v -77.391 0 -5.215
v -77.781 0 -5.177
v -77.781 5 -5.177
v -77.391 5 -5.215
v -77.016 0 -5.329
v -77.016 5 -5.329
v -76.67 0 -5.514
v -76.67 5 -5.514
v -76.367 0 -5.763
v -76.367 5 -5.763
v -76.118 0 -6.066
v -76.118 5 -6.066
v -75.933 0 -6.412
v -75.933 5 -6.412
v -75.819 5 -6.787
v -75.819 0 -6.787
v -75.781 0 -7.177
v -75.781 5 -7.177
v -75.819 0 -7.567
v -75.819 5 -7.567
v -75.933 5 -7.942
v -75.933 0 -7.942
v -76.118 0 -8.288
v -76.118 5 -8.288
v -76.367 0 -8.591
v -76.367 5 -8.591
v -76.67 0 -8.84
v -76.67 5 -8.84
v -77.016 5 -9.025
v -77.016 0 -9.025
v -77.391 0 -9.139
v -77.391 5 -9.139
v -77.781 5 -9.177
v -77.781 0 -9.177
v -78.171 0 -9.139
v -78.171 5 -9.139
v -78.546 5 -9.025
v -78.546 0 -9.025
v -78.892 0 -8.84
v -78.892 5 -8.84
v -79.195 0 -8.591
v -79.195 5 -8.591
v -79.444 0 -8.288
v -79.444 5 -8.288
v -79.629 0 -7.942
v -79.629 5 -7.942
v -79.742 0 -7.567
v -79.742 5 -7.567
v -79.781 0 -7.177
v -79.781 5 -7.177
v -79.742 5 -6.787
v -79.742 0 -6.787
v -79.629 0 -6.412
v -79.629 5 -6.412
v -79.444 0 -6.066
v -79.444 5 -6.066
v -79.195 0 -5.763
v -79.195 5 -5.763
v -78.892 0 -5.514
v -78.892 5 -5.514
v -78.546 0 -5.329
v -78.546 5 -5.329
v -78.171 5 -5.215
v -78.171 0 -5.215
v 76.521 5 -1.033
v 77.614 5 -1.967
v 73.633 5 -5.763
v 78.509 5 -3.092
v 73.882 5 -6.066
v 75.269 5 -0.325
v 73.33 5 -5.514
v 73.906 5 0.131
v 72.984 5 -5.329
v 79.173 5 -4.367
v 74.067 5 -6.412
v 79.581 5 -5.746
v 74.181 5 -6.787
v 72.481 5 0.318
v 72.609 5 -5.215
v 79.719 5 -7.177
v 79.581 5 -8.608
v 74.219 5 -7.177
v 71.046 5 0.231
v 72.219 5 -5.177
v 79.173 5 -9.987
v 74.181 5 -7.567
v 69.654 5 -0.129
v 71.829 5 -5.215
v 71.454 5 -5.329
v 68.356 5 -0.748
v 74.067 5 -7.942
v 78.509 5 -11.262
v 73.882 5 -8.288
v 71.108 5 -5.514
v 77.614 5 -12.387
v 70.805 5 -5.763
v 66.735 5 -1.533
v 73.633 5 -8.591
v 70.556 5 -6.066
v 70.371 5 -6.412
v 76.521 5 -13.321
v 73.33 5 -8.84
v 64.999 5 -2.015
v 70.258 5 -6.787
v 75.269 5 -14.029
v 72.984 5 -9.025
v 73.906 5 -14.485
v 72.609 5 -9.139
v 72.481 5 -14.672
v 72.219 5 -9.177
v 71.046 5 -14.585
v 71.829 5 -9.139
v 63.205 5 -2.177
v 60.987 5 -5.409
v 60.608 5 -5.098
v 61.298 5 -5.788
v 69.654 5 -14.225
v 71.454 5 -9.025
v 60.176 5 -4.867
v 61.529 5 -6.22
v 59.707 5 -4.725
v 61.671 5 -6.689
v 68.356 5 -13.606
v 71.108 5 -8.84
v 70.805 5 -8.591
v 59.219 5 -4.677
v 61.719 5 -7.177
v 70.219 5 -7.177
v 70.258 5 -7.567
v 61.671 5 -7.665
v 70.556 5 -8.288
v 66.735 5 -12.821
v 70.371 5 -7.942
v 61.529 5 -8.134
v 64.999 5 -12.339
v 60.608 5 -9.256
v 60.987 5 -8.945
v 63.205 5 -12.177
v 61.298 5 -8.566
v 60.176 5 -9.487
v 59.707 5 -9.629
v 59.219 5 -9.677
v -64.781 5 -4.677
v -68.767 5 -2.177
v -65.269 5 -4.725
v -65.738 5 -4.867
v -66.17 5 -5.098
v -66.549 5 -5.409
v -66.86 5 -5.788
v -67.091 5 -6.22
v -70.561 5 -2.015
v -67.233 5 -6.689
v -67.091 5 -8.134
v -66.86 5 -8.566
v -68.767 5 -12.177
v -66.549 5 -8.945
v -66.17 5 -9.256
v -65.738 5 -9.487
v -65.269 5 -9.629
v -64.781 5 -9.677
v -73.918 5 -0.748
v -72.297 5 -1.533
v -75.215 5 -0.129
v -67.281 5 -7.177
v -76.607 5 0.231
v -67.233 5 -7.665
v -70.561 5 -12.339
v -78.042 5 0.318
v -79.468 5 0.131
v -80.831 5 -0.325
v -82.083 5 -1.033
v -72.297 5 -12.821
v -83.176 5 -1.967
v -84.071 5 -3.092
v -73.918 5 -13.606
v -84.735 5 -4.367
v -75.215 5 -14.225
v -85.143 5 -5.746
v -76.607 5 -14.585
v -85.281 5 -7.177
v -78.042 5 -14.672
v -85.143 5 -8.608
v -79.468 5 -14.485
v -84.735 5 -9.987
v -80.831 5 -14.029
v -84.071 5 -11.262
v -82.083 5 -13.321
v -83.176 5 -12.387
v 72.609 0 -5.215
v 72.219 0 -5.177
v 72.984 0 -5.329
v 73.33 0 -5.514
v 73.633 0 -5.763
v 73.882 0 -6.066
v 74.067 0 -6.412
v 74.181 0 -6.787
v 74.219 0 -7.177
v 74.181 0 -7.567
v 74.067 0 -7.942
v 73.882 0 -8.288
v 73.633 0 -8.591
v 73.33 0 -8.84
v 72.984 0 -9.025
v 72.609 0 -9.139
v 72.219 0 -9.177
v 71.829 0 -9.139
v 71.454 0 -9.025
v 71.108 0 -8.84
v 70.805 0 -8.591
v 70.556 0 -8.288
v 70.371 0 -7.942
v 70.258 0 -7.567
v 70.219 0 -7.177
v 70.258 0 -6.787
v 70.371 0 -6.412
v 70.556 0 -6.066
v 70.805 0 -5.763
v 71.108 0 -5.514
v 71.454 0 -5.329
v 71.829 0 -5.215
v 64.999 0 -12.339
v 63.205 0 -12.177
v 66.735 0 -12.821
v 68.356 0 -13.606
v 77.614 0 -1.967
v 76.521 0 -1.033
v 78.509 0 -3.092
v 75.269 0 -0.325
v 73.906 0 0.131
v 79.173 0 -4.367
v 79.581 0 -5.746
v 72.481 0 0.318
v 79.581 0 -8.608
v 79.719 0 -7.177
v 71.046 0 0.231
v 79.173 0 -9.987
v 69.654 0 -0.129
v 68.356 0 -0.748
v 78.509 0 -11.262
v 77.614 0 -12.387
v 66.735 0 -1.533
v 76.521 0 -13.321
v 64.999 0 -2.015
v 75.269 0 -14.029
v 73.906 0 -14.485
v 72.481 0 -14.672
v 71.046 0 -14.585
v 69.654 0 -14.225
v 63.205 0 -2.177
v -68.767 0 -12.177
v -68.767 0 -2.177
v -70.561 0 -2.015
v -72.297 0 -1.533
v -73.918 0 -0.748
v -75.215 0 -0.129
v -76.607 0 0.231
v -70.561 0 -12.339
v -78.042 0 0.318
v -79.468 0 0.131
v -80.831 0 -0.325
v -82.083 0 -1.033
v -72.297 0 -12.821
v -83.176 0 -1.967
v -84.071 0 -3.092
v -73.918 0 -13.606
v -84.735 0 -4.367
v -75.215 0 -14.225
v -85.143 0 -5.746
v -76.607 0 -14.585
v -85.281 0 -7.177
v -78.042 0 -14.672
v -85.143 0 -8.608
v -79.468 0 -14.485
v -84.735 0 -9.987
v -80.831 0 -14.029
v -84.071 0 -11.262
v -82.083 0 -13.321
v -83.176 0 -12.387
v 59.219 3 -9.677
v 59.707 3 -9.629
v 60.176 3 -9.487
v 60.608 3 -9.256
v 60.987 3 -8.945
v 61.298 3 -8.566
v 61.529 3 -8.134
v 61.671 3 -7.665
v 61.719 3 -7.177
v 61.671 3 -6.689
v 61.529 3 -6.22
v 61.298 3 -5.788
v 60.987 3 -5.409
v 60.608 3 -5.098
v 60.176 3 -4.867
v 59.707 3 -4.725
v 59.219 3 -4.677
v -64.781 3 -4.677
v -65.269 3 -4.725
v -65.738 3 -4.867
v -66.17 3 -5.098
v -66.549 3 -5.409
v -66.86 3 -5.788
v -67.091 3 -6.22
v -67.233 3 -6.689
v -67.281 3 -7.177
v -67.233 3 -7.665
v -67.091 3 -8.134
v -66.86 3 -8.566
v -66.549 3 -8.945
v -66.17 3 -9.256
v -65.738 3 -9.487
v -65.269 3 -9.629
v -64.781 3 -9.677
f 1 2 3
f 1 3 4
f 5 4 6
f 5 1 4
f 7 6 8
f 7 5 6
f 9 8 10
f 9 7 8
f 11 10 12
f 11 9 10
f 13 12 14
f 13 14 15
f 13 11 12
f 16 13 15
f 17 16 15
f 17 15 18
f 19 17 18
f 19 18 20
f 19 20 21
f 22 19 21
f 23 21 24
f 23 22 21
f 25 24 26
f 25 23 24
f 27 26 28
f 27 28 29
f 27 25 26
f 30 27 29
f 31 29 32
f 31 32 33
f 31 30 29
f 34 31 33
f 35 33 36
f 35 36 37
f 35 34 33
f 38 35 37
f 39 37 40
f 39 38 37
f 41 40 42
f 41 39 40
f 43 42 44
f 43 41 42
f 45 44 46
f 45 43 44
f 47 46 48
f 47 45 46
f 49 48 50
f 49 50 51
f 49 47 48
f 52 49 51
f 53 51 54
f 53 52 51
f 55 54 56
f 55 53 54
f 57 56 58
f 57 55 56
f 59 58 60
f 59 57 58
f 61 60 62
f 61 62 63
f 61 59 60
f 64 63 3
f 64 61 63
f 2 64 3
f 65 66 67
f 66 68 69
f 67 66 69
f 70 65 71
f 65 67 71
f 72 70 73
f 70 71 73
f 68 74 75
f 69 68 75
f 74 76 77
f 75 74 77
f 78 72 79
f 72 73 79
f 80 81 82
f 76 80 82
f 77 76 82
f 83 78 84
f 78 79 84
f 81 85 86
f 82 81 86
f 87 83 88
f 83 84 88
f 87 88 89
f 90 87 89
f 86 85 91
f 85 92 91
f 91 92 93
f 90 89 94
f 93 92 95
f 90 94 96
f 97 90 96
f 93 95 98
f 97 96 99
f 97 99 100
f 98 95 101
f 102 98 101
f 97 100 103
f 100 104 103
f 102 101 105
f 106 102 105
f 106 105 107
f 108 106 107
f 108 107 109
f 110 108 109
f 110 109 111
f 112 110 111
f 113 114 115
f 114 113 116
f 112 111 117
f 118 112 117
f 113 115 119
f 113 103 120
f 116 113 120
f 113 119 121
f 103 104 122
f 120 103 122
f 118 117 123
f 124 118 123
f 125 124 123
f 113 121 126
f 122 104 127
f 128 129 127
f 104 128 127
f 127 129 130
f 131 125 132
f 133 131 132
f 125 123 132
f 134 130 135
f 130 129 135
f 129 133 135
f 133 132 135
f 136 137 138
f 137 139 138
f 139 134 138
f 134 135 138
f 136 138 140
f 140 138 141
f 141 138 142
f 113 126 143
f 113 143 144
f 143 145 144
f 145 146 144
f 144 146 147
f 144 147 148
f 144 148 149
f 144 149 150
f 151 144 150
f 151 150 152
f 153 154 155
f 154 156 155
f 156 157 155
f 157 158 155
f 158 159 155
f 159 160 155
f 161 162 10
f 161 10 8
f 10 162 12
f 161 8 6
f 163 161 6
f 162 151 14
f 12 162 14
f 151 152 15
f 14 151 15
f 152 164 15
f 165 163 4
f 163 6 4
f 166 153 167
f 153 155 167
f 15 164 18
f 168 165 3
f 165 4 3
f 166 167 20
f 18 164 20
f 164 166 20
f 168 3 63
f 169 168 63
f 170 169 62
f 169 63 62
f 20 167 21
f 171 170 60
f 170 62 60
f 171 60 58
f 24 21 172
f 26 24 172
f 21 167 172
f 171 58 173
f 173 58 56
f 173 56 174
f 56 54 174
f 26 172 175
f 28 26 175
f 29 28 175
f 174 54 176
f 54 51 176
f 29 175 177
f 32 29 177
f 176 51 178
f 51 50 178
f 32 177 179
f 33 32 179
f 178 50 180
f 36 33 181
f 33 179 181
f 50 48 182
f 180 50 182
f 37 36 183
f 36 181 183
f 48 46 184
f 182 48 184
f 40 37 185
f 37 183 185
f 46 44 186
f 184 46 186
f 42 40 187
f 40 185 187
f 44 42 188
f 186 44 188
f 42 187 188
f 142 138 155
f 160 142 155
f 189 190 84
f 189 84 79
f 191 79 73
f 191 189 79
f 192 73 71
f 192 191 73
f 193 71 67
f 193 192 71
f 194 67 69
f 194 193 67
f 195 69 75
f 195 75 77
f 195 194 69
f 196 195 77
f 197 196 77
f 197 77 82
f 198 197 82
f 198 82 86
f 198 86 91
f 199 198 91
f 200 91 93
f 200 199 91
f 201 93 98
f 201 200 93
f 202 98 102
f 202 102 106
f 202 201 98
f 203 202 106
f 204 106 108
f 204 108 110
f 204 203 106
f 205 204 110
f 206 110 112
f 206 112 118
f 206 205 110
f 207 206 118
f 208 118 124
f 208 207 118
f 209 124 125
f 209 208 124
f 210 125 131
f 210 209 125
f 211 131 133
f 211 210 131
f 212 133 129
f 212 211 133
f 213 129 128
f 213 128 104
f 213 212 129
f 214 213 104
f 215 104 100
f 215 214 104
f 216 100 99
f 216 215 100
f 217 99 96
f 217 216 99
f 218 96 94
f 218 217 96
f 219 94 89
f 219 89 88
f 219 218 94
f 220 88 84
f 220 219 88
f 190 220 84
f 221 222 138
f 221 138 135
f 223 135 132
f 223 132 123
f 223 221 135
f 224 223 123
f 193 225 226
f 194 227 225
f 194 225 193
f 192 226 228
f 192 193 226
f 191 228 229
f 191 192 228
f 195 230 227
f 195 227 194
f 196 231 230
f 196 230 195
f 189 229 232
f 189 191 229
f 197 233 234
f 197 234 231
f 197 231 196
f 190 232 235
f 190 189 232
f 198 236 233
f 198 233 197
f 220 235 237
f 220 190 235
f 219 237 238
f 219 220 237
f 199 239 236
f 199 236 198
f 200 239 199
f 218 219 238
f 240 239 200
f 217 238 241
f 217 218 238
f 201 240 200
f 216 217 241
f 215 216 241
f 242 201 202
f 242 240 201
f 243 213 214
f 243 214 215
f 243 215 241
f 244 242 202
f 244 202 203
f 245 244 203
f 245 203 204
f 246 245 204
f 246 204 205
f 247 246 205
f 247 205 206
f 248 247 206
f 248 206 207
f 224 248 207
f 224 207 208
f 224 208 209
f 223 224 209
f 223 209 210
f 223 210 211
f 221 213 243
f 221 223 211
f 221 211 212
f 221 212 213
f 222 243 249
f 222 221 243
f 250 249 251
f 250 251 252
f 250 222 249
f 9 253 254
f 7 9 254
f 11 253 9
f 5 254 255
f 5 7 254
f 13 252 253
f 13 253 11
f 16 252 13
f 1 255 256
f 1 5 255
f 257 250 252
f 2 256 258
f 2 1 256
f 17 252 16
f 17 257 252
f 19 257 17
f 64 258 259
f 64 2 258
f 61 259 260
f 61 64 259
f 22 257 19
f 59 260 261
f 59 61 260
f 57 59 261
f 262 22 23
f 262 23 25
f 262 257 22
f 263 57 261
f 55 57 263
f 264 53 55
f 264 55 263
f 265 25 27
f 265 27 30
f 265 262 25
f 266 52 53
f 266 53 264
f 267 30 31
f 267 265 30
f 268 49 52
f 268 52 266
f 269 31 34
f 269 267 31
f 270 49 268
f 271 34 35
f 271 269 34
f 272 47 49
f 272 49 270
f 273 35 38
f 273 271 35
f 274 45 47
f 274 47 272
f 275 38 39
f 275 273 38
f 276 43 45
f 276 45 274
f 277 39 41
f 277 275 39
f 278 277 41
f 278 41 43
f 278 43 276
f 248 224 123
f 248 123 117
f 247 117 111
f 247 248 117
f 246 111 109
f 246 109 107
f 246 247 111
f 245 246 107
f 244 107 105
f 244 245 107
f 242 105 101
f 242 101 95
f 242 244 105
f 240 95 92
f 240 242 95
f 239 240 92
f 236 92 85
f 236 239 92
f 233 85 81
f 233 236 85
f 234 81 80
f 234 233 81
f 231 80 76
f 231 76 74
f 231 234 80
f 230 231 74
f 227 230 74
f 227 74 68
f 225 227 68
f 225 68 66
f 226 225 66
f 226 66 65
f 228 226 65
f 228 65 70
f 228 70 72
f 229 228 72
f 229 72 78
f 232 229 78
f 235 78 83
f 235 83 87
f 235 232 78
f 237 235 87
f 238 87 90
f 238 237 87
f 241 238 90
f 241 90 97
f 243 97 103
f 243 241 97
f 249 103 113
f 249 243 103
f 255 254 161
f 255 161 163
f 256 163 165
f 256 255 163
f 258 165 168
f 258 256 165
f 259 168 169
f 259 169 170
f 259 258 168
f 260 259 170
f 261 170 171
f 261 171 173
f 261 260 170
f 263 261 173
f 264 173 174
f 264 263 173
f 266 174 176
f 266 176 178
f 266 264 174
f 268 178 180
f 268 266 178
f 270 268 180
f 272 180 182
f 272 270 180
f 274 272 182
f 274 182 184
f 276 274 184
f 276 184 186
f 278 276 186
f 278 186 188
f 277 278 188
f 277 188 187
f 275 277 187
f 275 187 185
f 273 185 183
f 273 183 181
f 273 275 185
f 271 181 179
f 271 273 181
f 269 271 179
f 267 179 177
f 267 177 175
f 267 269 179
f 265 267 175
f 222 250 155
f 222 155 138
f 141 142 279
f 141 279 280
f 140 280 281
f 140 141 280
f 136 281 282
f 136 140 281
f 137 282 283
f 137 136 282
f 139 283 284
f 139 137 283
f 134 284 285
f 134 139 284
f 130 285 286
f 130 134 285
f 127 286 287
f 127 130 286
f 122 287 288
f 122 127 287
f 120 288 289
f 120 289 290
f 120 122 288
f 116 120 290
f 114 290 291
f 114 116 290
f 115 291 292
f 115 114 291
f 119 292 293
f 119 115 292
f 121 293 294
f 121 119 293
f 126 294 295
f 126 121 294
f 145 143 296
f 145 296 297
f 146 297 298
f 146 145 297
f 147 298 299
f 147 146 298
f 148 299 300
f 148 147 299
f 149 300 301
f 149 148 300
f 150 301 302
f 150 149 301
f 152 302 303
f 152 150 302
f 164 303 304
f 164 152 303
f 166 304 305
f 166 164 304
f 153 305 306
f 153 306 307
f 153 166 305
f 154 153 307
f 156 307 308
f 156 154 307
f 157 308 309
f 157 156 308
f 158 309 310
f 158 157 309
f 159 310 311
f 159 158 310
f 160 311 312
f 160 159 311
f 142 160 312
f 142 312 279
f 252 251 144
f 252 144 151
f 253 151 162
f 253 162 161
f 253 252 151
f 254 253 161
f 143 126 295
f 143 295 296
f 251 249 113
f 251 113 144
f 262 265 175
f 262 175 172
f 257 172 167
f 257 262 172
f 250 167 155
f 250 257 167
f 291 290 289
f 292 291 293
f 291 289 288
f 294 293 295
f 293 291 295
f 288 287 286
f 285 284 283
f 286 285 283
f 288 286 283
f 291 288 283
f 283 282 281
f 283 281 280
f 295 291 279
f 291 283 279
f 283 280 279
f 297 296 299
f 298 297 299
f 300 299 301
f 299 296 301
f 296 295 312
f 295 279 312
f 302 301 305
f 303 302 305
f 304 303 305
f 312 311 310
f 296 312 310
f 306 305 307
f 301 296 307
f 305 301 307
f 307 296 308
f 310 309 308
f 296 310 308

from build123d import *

# Parameters (mm, degrees)
SKETCH1_R           = 2
BOSS_EXTRUDE1_DEPTH = 5
CUT_EXTRUDE1_DEPTH  = 2


with BuildPart() as part:
    # Sketch1 → Boss-Extrude1 (new body)
    with BuildSketch(Plane(origin=(0, 0, 0), x_dir=(1, 0, 0), z_dir=(0, 1, 0))):
        with BuildLine():
            Line((-68.767020688, 12.176966292), (63.205222935, 12.176966292))
            ThreePointArc((63.205222935, 12.176966292), (65.877835354, 12.540725176), (68.356010471, 13.605537721))
            ThreePointArc((68.356010471, 13.605537721), (79.719101124, 7.176966292), (68.356010471, 0.748394864))
            ThreePointArc((68.356010471, 0.748394864), (65.877835354, 1.813207409), (63.205222935, 2.176966292))
            Line((63.205222935, 2.176966292), (-68.767020688, 2.176966292))
            ThreePointArc((-68.767020688, 2.176966292), (-71.439633107, 1.813207409), (-73.917808224, 0.748394864))
            ThreePointArc((-73.917808224, 0.748394864), (-85.280898876, 7.176966292), (-73.917808224, 13.605537721))
            ThreePointArc((-73.917808224, 13.605537721), (-71.439633107, 12.540725176), (-68.767020688, 12.176966292))
        make_face()
        with Locations(Location((-77.780898876, 7.176966292, 0), (0, 0, 270))):
            Circle(SKETCH1_R, mode=Mode.SUBTRACT)
        with Locations(Location((72.219101124, 7.176966292, 0), (0, 0, 270))):
            Circle(SKETCH1_R, mode=Mode.SUBTRACT)
    extrude(amount=BOSS_EXTRUDE1_DEPTH)

    # Sketch3 → Cut-Extrude1 (cut)
    with BuildSketch(Plane(origin=(0, 5, 0), x_dir=(1, 0, 0), z_dir=(0, 1, 0))):
        with BuildLine():
            Line((-64.780898876, 9.676966292), (59.219101124, 9.676966292))
            ThreePointArc((59.219101124, 9.676966292), (61.719101124, 7.176966292), (59.219101124, 4.676966292))
            Line((59.219101124, 4.676966292), (-64.780898876, 4.676966292))
            ThreePointArc((-64.780898876, 4.676966292), (-67.280898876, 7.176966292), (-64.780898876, 9.676966292))
        make_face()
    extrude(amount=-CUT_EXTRUDE1_DEPTH, mode=Mode.SUBTRACT)


solid = part.part
